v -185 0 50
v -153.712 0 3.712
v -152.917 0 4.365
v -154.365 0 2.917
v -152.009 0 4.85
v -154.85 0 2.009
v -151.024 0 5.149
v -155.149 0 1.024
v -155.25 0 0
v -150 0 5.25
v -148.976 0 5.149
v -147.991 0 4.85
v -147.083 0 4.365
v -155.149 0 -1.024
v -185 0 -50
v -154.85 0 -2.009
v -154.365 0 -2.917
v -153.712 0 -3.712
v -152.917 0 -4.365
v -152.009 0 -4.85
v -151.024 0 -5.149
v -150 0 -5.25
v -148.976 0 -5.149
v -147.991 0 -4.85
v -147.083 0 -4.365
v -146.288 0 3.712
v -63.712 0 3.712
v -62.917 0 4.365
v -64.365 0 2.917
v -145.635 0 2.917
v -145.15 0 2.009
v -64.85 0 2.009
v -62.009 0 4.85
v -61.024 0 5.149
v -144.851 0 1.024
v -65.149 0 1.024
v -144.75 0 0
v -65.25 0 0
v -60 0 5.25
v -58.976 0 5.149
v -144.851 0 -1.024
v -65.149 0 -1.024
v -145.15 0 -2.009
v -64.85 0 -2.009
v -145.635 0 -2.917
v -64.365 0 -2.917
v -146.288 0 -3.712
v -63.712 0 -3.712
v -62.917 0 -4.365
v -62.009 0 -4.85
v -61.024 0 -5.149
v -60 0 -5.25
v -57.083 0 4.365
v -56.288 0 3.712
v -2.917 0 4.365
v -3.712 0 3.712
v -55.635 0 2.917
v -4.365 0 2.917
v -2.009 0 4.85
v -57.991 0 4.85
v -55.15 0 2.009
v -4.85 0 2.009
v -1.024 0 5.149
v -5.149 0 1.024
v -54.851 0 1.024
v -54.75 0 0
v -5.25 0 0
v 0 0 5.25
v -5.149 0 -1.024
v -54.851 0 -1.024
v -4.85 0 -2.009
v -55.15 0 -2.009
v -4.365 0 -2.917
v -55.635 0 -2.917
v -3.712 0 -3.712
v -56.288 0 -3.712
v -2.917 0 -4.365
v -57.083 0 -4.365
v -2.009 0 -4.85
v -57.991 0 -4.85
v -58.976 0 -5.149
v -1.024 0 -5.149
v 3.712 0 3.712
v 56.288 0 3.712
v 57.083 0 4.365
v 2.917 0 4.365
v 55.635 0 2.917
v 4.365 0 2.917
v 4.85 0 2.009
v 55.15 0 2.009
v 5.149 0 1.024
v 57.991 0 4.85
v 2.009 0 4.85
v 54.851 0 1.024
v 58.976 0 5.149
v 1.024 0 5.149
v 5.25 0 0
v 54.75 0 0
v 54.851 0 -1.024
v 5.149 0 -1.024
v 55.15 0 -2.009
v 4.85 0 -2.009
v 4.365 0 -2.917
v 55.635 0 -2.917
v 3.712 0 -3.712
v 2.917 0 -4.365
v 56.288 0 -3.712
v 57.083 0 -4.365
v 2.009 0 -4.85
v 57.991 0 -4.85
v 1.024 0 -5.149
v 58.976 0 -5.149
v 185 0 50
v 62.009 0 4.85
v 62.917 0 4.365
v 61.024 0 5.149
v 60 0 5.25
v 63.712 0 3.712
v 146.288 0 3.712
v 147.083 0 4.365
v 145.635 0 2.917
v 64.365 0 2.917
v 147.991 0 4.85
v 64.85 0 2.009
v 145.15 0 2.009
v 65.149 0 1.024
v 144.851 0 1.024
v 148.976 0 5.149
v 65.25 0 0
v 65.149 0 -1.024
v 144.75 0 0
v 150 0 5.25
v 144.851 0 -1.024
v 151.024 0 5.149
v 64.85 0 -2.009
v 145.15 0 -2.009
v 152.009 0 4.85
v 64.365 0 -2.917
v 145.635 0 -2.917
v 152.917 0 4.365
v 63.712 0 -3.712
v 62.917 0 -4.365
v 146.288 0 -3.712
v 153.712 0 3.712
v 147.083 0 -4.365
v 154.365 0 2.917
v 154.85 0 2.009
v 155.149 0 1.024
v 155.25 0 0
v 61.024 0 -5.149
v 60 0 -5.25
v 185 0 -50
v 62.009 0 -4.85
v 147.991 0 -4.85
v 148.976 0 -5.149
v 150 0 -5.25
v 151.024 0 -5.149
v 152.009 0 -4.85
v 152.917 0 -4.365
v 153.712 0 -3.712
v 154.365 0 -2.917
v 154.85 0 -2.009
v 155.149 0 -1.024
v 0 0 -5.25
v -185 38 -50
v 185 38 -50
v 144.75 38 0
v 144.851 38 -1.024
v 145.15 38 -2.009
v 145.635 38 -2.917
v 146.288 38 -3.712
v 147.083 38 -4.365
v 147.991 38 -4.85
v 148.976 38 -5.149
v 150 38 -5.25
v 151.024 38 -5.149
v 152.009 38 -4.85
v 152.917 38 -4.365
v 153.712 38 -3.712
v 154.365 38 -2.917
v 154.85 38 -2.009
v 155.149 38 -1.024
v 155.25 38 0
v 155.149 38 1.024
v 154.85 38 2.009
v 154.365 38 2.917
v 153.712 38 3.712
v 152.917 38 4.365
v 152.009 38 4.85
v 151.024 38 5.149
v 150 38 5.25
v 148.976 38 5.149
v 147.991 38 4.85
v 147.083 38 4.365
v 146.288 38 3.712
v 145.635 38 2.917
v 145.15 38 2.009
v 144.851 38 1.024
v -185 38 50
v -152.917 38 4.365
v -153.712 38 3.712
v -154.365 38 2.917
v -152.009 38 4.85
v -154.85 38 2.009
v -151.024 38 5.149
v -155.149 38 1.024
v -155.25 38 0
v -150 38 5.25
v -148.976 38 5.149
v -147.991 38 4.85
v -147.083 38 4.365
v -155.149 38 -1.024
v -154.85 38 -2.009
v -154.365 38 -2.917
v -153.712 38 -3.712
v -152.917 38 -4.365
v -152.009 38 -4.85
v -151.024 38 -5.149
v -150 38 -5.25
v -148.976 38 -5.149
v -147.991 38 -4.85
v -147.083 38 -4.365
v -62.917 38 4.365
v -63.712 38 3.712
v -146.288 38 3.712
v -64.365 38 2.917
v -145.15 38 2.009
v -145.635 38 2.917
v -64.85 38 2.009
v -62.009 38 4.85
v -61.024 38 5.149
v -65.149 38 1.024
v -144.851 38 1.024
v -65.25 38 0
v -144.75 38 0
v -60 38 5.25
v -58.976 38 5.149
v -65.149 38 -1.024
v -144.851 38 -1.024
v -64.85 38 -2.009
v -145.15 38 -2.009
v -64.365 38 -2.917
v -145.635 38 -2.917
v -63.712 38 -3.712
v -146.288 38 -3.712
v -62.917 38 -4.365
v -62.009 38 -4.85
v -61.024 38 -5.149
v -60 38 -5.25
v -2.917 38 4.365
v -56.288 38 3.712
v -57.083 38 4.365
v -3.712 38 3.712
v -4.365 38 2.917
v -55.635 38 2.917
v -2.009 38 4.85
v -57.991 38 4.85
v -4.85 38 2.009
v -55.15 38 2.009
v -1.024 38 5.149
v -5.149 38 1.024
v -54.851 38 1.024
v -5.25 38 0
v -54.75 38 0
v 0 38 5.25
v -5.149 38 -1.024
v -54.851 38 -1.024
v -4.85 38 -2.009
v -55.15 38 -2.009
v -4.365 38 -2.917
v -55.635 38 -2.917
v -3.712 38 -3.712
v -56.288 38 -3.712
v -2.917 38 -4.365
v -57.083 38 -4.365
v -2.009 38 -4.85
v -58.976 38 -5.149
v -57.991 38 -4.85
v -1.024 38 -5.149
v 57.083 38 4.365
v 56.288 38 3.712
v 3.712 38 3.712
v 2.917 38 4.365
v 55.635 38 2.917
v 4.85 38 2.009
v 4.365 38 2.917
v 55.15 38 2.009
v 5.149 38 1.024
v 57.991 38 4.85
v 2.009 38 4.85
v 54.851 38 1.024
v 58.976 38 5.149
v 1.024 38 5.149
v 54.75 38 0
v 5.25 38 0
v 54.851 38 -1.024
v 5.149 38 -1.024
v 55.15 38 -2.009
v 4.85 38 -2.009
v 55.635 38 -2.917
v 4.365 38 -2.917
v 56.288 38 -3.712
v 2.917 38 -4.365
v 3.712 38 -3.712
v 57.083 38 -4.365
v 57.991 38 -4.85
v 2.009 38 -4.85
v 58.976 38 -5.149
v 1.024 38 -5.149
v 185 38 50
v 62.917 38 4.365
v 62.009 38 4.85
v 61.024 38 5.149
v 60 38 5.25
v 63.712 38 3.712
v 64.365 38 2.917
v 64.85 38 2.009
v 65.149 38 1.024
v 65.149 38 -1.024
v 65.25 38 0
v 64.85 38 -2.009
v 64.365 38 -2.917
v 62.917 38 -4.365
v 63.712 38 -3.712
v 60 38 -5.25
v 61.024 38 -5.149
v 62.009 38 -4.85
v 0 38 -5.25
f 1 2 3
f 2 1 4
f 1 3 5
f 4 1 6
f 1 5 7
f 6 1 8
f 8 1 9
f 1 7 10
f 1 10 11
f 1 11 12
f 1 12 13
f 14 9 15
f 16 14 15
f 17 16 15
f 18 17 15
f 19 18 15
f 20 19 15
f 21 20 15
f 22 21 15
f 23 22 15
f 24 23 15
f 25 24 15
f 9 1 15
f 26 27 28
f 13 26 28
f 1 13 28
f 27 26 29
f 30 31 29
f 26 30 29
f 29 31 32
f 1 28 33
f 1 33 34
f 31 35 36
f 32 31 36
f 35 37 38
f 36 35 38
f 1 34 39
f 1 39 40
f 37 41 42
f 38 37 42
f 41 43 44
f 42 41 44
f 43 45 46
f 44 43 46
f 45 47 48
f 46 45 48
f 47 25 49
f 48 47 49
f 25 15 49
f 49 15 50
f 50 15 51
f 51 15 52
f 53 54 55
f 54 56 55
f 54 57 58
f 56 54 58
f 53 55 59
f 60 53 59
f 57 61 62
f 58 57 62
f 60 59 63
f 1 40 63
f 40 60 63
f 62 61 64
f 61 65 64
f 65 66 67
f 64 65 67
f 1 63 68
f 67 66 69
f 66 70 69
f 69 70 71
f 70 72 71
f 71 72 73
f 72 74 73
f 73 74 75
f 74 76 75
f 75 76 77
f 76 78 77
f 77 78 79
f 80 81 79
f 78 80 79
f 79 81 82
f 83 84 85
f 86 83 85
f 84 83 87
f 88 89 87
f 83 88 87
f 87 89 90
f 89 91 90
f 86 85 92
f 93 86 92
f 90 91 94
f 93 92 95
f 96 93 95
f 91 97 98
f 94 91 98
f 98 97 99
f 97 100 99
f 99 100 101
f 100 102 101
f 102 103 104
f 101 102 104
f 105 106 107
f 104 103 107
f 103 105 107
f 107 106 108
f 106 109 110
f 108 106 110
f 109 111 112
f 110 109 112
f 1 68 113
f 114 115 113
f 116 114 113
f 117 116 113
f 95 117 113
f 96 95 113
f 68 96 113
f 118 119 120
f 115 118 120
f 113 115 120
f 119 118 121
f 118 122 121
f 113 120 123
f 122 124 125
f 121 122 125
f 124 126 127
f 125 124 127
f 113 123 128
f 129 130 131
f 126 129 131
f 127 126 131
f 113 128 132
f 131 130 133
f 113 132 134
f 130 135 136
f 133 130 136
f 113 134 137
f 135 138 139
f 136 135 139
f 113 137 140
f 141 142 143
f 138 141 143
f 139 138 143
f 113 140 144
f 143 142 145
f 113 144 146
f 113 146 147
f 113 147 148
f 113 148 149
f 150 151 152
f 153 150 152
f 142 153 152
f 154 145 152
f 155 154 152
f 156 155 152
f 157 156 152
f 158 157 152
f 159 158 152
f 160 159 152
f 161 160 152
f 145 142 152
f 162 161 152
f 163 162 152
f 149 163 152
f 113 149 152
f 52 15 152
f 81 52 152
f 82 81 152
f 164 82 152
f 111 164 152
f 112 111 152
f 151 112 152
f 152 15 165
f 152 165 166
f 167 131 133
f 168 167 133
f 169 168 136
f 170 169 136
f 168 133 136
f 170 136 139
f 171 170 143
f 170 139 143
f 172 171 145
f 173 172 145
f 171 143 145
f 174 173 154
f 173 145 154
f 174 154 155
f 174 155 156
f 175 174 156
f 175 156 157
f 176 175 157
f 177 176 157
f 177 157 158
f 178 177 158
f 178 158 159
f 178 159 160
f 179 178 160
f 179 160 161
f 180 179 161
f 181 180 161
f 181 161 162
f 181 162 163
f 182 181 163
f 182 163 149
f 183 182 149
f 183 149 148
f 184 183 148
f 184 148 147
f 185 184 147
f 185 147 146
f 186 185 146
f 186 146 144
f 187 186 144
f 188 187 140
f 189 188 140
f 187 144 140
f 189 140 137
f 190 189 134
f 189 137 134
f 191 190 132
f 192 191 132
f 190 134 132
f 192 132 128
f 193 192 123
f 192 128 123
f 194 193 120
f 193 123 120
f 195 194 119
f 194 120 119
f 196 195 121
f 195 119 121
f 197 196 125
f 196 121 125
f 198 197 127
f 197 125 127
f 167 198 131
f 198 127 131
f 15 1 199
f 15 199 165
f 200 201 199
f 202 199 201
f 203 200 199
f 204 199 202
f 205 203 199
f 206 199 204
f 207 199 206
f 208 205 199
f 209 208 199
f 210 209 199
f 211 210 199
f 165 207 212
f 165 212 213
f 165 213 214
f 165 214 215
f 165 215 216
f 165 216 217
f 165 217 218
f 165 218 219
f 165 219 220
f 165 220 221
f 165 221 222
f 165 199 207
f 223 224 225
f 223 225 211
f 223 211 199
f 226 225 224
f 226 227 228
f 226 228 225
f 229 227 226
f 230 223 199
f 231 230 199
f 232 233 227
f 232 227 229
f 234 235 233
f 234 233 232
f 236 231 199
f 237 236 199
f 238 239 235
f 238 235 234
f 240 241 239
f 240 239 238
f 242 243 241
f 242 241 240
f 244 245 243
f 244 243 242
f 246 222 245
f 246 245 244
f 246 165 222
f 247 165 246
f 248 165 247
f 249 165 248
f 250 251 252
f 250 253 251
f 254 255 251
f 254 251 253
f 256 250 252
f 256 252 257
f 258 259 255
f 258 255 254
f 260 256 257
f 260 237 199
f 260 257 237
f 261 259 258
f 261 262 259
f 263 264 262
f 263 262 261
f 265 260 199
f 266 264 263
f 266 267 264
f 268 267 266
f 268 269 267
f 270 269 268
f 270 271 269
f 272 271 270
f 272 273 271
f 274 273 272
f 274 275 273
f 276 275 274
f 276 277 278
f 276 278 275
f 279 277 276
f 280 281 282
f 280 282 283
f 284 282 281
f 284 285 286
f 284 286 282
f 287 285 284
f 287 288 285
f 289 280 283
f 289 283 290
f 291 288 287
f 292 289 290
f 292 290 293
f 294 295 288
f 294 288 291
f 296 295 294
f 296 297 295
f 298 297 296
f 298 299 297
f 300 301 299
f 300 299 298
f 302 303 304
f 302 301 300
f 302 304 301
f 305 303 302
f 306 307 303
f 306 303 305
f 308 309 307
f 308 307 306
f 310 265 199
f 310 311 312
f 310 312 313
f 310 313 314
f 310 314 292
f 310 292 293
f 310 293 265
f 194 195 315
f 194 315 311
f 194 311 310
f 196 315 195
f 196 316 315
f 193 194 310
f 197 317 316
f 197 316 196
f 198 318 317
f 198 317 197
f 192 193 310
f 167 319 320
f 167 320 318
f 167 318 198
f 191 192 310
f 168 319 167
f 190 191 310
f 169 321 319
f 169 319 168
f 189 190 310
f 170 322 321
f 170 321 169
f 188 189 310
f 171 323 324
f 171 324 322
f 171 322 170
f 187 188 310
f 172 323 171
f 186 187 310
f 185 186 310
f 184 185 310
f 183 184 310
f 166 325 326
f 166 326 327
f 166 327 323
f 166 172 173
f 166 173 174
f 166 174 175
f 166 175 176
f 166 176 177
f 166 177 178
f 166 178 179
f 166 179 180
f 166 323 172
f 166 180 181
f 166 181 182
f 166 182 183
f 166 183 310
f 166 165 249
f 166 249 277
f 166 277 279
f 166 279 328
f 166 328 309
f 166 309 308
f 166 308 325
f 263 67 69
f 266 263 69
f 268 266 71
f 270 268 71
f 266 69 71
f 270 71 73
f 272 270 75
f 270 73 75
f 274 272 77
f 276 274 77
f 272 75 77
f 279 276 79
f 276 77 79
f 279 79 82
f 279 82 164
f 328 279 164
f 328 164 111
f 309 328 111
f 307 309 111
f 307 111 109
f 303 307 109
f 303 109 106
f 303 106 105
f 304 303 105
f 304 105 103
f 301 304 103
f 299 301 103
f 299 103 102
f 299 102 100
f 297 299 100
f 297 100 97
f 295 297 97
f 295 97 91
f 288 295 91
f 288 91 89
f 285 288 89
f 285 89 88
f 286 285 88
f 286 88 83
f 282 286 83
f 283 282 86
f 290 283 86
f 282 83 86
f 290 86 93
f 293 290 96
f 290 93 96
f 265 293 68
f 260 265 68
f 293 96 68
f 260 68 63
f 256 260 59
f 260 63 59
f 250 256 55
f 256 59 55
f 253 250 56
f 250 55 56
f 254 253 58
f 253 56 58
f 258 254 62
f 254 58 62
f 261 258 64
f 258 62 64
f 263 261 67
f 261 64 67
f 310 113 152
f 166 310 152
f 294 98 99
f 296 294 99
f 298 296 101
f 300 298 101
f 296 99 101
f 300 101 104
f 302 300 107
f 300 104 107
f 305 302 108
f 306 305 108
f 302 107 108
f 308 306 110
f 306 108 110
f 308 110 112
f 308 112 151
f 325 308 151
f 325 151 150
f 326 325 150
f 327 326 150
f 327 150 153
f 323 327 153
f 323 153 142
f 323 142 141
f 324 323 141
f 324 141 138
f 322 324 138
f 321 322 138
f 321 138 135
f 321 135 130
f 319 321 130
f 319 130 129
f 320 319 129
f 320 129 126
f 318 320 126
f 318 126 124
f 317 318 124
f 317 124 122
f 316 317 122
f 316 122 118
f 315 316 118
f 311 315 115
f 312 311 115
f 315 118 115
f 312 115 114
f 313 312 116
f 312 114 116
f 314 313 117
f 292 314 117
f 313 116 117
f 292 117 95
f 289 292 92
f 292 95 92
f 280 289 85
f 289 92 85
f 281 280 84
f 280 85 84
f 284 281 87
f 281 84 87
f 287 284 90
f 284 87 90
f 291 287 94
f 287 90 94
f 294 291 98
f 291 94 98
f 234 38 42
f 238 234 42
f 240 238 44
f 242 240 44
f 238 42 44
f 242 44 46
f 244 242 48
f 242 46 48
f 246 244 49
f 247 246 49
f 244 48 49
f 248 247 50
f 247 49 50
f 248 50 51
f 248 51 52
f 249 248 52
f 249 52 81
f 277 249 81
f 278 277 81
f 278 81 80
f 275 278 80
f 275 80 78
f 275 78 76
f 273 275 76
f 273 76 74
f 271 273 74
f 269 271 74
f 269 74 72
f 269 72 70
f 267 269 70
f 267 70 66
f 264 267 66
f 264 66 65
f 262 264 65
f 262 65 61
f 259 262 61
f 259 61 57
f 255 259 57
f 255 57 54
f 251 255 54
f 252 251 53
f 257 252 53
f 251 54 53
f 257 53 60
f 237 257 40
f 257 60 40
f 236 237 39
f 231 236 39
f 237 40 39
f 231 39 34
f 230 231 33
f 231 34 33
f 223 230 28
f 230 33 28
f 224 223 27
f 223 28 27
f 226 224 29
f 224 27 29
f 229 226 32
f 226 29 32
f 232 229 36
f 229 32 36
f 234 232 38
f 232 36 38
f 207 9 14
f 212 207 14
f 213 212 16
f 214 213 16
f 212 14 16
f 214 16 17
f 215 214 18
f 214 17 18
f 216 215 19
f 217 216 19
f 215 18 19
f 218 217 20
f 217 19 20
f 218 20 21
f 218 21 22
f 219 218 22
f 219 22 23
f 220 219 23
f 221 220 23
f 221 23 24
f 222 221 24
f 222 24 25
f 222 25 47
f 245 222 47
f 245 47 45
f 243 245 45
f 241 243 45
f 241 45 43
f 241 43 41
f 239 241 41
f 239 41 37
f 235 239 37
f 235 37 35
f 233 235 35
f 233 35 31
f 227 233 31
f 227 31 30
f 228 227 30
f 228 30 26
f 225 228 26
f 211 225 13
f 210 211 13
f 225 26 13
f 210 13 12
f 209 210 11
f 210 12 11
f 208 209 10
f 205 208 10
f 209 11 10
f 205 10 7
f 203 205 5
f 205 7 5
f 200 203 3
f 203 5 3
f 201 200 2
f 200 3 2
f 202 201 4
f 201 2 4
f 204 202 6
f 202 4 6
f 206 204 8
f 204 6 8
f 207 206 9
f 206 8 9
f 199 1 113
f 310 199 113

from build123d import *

# Parameters (mm, degrees)
SKETCH_1_W             = 370
SKETCH_1_H             = 100
EXTRUDE_1_DEPTH        = 38
M12X1_25_1_D           = 10.5
PATTERN_LINEAR_1_COUNT = 2
PATTERN_LINEAR_1_PITCH = 90
PATTERN_LINEAR_3_COUNT = 2
PATTERN_LINEAR_3_PITCH = 150
PATTERN_LINEAR_4_COUNT = 2
PATTERN_LINEAR_4_PITCH = 210
PATTERN_LINEAR_5_COUNT = 2
PATTERN_LINEAR_5_PITCH = 300


with BuildPart() as part:
    # 草图1 → 凸台-拉伸1 (new body)
    with BuildSketch(Plane(origin=(0, 0, 0), x_dir=(1, 0, 0), z_dir=(0, 1, 0))):
        Rectangle(SKETCH_1_W, SKETCH_1_H)
    extrude(amount=EXTRUDE_1_DEPTH)

    # M12x1.25 螺纹孔1 (through all)
    with Locations(Plane(origin=(0, 38, 0), x_dir=(1, 0, 0), z_dir=(0, 1, 0))):
        with Locations((-150, 0)):
            m12x1_25_1 = Hole(M12X1_25_1_D / 2)

    # 阵列(线性)1: M12x1.25 螺纹孔1 ×2
    with Locations(*[(i * PATTERN_LINEAR_1_PITCH, 0, 0) for i in range(1, PATTERN_LINEAR_1_COUNT)]):
        add(m12x1_25_1, mode=Mode.SUBTRACT)

    # 阵列(线性)3: M12x1.25 螺纹孔1 ×2
    with Locations(*[(i * PATTERN_LINEAR_3_PITCH, 0, 0) for i in range(1, PATTERN_LINEAR_3_COUNT)]):
        add(m12x1_25_1, mode=Mode.SUBTRACT)

    # 阵列(线性)4: M12x1.25 螺纹孔1 ×2
    with Locations(*[(i * PATTERN_LINEAR_4_PITCH, 0, 0) for i in range(1, PATTERN_LINEAR_4_COUNT)]):
        add(m12x1_25_1, mode=Mode.SUBTRACT)

    # 阵列(线性)5: M12x1.25 螺纹孔1 ×2
    with Locations(*[(i * PATTERN_LINEAR_5_PITCH, 0, 0) for i in range(1, PATTERN_LINEAR_5_COUNT)]):
        add(m12x1_25_1, mode=Mode.SUBTRACT)


solid = part.part
